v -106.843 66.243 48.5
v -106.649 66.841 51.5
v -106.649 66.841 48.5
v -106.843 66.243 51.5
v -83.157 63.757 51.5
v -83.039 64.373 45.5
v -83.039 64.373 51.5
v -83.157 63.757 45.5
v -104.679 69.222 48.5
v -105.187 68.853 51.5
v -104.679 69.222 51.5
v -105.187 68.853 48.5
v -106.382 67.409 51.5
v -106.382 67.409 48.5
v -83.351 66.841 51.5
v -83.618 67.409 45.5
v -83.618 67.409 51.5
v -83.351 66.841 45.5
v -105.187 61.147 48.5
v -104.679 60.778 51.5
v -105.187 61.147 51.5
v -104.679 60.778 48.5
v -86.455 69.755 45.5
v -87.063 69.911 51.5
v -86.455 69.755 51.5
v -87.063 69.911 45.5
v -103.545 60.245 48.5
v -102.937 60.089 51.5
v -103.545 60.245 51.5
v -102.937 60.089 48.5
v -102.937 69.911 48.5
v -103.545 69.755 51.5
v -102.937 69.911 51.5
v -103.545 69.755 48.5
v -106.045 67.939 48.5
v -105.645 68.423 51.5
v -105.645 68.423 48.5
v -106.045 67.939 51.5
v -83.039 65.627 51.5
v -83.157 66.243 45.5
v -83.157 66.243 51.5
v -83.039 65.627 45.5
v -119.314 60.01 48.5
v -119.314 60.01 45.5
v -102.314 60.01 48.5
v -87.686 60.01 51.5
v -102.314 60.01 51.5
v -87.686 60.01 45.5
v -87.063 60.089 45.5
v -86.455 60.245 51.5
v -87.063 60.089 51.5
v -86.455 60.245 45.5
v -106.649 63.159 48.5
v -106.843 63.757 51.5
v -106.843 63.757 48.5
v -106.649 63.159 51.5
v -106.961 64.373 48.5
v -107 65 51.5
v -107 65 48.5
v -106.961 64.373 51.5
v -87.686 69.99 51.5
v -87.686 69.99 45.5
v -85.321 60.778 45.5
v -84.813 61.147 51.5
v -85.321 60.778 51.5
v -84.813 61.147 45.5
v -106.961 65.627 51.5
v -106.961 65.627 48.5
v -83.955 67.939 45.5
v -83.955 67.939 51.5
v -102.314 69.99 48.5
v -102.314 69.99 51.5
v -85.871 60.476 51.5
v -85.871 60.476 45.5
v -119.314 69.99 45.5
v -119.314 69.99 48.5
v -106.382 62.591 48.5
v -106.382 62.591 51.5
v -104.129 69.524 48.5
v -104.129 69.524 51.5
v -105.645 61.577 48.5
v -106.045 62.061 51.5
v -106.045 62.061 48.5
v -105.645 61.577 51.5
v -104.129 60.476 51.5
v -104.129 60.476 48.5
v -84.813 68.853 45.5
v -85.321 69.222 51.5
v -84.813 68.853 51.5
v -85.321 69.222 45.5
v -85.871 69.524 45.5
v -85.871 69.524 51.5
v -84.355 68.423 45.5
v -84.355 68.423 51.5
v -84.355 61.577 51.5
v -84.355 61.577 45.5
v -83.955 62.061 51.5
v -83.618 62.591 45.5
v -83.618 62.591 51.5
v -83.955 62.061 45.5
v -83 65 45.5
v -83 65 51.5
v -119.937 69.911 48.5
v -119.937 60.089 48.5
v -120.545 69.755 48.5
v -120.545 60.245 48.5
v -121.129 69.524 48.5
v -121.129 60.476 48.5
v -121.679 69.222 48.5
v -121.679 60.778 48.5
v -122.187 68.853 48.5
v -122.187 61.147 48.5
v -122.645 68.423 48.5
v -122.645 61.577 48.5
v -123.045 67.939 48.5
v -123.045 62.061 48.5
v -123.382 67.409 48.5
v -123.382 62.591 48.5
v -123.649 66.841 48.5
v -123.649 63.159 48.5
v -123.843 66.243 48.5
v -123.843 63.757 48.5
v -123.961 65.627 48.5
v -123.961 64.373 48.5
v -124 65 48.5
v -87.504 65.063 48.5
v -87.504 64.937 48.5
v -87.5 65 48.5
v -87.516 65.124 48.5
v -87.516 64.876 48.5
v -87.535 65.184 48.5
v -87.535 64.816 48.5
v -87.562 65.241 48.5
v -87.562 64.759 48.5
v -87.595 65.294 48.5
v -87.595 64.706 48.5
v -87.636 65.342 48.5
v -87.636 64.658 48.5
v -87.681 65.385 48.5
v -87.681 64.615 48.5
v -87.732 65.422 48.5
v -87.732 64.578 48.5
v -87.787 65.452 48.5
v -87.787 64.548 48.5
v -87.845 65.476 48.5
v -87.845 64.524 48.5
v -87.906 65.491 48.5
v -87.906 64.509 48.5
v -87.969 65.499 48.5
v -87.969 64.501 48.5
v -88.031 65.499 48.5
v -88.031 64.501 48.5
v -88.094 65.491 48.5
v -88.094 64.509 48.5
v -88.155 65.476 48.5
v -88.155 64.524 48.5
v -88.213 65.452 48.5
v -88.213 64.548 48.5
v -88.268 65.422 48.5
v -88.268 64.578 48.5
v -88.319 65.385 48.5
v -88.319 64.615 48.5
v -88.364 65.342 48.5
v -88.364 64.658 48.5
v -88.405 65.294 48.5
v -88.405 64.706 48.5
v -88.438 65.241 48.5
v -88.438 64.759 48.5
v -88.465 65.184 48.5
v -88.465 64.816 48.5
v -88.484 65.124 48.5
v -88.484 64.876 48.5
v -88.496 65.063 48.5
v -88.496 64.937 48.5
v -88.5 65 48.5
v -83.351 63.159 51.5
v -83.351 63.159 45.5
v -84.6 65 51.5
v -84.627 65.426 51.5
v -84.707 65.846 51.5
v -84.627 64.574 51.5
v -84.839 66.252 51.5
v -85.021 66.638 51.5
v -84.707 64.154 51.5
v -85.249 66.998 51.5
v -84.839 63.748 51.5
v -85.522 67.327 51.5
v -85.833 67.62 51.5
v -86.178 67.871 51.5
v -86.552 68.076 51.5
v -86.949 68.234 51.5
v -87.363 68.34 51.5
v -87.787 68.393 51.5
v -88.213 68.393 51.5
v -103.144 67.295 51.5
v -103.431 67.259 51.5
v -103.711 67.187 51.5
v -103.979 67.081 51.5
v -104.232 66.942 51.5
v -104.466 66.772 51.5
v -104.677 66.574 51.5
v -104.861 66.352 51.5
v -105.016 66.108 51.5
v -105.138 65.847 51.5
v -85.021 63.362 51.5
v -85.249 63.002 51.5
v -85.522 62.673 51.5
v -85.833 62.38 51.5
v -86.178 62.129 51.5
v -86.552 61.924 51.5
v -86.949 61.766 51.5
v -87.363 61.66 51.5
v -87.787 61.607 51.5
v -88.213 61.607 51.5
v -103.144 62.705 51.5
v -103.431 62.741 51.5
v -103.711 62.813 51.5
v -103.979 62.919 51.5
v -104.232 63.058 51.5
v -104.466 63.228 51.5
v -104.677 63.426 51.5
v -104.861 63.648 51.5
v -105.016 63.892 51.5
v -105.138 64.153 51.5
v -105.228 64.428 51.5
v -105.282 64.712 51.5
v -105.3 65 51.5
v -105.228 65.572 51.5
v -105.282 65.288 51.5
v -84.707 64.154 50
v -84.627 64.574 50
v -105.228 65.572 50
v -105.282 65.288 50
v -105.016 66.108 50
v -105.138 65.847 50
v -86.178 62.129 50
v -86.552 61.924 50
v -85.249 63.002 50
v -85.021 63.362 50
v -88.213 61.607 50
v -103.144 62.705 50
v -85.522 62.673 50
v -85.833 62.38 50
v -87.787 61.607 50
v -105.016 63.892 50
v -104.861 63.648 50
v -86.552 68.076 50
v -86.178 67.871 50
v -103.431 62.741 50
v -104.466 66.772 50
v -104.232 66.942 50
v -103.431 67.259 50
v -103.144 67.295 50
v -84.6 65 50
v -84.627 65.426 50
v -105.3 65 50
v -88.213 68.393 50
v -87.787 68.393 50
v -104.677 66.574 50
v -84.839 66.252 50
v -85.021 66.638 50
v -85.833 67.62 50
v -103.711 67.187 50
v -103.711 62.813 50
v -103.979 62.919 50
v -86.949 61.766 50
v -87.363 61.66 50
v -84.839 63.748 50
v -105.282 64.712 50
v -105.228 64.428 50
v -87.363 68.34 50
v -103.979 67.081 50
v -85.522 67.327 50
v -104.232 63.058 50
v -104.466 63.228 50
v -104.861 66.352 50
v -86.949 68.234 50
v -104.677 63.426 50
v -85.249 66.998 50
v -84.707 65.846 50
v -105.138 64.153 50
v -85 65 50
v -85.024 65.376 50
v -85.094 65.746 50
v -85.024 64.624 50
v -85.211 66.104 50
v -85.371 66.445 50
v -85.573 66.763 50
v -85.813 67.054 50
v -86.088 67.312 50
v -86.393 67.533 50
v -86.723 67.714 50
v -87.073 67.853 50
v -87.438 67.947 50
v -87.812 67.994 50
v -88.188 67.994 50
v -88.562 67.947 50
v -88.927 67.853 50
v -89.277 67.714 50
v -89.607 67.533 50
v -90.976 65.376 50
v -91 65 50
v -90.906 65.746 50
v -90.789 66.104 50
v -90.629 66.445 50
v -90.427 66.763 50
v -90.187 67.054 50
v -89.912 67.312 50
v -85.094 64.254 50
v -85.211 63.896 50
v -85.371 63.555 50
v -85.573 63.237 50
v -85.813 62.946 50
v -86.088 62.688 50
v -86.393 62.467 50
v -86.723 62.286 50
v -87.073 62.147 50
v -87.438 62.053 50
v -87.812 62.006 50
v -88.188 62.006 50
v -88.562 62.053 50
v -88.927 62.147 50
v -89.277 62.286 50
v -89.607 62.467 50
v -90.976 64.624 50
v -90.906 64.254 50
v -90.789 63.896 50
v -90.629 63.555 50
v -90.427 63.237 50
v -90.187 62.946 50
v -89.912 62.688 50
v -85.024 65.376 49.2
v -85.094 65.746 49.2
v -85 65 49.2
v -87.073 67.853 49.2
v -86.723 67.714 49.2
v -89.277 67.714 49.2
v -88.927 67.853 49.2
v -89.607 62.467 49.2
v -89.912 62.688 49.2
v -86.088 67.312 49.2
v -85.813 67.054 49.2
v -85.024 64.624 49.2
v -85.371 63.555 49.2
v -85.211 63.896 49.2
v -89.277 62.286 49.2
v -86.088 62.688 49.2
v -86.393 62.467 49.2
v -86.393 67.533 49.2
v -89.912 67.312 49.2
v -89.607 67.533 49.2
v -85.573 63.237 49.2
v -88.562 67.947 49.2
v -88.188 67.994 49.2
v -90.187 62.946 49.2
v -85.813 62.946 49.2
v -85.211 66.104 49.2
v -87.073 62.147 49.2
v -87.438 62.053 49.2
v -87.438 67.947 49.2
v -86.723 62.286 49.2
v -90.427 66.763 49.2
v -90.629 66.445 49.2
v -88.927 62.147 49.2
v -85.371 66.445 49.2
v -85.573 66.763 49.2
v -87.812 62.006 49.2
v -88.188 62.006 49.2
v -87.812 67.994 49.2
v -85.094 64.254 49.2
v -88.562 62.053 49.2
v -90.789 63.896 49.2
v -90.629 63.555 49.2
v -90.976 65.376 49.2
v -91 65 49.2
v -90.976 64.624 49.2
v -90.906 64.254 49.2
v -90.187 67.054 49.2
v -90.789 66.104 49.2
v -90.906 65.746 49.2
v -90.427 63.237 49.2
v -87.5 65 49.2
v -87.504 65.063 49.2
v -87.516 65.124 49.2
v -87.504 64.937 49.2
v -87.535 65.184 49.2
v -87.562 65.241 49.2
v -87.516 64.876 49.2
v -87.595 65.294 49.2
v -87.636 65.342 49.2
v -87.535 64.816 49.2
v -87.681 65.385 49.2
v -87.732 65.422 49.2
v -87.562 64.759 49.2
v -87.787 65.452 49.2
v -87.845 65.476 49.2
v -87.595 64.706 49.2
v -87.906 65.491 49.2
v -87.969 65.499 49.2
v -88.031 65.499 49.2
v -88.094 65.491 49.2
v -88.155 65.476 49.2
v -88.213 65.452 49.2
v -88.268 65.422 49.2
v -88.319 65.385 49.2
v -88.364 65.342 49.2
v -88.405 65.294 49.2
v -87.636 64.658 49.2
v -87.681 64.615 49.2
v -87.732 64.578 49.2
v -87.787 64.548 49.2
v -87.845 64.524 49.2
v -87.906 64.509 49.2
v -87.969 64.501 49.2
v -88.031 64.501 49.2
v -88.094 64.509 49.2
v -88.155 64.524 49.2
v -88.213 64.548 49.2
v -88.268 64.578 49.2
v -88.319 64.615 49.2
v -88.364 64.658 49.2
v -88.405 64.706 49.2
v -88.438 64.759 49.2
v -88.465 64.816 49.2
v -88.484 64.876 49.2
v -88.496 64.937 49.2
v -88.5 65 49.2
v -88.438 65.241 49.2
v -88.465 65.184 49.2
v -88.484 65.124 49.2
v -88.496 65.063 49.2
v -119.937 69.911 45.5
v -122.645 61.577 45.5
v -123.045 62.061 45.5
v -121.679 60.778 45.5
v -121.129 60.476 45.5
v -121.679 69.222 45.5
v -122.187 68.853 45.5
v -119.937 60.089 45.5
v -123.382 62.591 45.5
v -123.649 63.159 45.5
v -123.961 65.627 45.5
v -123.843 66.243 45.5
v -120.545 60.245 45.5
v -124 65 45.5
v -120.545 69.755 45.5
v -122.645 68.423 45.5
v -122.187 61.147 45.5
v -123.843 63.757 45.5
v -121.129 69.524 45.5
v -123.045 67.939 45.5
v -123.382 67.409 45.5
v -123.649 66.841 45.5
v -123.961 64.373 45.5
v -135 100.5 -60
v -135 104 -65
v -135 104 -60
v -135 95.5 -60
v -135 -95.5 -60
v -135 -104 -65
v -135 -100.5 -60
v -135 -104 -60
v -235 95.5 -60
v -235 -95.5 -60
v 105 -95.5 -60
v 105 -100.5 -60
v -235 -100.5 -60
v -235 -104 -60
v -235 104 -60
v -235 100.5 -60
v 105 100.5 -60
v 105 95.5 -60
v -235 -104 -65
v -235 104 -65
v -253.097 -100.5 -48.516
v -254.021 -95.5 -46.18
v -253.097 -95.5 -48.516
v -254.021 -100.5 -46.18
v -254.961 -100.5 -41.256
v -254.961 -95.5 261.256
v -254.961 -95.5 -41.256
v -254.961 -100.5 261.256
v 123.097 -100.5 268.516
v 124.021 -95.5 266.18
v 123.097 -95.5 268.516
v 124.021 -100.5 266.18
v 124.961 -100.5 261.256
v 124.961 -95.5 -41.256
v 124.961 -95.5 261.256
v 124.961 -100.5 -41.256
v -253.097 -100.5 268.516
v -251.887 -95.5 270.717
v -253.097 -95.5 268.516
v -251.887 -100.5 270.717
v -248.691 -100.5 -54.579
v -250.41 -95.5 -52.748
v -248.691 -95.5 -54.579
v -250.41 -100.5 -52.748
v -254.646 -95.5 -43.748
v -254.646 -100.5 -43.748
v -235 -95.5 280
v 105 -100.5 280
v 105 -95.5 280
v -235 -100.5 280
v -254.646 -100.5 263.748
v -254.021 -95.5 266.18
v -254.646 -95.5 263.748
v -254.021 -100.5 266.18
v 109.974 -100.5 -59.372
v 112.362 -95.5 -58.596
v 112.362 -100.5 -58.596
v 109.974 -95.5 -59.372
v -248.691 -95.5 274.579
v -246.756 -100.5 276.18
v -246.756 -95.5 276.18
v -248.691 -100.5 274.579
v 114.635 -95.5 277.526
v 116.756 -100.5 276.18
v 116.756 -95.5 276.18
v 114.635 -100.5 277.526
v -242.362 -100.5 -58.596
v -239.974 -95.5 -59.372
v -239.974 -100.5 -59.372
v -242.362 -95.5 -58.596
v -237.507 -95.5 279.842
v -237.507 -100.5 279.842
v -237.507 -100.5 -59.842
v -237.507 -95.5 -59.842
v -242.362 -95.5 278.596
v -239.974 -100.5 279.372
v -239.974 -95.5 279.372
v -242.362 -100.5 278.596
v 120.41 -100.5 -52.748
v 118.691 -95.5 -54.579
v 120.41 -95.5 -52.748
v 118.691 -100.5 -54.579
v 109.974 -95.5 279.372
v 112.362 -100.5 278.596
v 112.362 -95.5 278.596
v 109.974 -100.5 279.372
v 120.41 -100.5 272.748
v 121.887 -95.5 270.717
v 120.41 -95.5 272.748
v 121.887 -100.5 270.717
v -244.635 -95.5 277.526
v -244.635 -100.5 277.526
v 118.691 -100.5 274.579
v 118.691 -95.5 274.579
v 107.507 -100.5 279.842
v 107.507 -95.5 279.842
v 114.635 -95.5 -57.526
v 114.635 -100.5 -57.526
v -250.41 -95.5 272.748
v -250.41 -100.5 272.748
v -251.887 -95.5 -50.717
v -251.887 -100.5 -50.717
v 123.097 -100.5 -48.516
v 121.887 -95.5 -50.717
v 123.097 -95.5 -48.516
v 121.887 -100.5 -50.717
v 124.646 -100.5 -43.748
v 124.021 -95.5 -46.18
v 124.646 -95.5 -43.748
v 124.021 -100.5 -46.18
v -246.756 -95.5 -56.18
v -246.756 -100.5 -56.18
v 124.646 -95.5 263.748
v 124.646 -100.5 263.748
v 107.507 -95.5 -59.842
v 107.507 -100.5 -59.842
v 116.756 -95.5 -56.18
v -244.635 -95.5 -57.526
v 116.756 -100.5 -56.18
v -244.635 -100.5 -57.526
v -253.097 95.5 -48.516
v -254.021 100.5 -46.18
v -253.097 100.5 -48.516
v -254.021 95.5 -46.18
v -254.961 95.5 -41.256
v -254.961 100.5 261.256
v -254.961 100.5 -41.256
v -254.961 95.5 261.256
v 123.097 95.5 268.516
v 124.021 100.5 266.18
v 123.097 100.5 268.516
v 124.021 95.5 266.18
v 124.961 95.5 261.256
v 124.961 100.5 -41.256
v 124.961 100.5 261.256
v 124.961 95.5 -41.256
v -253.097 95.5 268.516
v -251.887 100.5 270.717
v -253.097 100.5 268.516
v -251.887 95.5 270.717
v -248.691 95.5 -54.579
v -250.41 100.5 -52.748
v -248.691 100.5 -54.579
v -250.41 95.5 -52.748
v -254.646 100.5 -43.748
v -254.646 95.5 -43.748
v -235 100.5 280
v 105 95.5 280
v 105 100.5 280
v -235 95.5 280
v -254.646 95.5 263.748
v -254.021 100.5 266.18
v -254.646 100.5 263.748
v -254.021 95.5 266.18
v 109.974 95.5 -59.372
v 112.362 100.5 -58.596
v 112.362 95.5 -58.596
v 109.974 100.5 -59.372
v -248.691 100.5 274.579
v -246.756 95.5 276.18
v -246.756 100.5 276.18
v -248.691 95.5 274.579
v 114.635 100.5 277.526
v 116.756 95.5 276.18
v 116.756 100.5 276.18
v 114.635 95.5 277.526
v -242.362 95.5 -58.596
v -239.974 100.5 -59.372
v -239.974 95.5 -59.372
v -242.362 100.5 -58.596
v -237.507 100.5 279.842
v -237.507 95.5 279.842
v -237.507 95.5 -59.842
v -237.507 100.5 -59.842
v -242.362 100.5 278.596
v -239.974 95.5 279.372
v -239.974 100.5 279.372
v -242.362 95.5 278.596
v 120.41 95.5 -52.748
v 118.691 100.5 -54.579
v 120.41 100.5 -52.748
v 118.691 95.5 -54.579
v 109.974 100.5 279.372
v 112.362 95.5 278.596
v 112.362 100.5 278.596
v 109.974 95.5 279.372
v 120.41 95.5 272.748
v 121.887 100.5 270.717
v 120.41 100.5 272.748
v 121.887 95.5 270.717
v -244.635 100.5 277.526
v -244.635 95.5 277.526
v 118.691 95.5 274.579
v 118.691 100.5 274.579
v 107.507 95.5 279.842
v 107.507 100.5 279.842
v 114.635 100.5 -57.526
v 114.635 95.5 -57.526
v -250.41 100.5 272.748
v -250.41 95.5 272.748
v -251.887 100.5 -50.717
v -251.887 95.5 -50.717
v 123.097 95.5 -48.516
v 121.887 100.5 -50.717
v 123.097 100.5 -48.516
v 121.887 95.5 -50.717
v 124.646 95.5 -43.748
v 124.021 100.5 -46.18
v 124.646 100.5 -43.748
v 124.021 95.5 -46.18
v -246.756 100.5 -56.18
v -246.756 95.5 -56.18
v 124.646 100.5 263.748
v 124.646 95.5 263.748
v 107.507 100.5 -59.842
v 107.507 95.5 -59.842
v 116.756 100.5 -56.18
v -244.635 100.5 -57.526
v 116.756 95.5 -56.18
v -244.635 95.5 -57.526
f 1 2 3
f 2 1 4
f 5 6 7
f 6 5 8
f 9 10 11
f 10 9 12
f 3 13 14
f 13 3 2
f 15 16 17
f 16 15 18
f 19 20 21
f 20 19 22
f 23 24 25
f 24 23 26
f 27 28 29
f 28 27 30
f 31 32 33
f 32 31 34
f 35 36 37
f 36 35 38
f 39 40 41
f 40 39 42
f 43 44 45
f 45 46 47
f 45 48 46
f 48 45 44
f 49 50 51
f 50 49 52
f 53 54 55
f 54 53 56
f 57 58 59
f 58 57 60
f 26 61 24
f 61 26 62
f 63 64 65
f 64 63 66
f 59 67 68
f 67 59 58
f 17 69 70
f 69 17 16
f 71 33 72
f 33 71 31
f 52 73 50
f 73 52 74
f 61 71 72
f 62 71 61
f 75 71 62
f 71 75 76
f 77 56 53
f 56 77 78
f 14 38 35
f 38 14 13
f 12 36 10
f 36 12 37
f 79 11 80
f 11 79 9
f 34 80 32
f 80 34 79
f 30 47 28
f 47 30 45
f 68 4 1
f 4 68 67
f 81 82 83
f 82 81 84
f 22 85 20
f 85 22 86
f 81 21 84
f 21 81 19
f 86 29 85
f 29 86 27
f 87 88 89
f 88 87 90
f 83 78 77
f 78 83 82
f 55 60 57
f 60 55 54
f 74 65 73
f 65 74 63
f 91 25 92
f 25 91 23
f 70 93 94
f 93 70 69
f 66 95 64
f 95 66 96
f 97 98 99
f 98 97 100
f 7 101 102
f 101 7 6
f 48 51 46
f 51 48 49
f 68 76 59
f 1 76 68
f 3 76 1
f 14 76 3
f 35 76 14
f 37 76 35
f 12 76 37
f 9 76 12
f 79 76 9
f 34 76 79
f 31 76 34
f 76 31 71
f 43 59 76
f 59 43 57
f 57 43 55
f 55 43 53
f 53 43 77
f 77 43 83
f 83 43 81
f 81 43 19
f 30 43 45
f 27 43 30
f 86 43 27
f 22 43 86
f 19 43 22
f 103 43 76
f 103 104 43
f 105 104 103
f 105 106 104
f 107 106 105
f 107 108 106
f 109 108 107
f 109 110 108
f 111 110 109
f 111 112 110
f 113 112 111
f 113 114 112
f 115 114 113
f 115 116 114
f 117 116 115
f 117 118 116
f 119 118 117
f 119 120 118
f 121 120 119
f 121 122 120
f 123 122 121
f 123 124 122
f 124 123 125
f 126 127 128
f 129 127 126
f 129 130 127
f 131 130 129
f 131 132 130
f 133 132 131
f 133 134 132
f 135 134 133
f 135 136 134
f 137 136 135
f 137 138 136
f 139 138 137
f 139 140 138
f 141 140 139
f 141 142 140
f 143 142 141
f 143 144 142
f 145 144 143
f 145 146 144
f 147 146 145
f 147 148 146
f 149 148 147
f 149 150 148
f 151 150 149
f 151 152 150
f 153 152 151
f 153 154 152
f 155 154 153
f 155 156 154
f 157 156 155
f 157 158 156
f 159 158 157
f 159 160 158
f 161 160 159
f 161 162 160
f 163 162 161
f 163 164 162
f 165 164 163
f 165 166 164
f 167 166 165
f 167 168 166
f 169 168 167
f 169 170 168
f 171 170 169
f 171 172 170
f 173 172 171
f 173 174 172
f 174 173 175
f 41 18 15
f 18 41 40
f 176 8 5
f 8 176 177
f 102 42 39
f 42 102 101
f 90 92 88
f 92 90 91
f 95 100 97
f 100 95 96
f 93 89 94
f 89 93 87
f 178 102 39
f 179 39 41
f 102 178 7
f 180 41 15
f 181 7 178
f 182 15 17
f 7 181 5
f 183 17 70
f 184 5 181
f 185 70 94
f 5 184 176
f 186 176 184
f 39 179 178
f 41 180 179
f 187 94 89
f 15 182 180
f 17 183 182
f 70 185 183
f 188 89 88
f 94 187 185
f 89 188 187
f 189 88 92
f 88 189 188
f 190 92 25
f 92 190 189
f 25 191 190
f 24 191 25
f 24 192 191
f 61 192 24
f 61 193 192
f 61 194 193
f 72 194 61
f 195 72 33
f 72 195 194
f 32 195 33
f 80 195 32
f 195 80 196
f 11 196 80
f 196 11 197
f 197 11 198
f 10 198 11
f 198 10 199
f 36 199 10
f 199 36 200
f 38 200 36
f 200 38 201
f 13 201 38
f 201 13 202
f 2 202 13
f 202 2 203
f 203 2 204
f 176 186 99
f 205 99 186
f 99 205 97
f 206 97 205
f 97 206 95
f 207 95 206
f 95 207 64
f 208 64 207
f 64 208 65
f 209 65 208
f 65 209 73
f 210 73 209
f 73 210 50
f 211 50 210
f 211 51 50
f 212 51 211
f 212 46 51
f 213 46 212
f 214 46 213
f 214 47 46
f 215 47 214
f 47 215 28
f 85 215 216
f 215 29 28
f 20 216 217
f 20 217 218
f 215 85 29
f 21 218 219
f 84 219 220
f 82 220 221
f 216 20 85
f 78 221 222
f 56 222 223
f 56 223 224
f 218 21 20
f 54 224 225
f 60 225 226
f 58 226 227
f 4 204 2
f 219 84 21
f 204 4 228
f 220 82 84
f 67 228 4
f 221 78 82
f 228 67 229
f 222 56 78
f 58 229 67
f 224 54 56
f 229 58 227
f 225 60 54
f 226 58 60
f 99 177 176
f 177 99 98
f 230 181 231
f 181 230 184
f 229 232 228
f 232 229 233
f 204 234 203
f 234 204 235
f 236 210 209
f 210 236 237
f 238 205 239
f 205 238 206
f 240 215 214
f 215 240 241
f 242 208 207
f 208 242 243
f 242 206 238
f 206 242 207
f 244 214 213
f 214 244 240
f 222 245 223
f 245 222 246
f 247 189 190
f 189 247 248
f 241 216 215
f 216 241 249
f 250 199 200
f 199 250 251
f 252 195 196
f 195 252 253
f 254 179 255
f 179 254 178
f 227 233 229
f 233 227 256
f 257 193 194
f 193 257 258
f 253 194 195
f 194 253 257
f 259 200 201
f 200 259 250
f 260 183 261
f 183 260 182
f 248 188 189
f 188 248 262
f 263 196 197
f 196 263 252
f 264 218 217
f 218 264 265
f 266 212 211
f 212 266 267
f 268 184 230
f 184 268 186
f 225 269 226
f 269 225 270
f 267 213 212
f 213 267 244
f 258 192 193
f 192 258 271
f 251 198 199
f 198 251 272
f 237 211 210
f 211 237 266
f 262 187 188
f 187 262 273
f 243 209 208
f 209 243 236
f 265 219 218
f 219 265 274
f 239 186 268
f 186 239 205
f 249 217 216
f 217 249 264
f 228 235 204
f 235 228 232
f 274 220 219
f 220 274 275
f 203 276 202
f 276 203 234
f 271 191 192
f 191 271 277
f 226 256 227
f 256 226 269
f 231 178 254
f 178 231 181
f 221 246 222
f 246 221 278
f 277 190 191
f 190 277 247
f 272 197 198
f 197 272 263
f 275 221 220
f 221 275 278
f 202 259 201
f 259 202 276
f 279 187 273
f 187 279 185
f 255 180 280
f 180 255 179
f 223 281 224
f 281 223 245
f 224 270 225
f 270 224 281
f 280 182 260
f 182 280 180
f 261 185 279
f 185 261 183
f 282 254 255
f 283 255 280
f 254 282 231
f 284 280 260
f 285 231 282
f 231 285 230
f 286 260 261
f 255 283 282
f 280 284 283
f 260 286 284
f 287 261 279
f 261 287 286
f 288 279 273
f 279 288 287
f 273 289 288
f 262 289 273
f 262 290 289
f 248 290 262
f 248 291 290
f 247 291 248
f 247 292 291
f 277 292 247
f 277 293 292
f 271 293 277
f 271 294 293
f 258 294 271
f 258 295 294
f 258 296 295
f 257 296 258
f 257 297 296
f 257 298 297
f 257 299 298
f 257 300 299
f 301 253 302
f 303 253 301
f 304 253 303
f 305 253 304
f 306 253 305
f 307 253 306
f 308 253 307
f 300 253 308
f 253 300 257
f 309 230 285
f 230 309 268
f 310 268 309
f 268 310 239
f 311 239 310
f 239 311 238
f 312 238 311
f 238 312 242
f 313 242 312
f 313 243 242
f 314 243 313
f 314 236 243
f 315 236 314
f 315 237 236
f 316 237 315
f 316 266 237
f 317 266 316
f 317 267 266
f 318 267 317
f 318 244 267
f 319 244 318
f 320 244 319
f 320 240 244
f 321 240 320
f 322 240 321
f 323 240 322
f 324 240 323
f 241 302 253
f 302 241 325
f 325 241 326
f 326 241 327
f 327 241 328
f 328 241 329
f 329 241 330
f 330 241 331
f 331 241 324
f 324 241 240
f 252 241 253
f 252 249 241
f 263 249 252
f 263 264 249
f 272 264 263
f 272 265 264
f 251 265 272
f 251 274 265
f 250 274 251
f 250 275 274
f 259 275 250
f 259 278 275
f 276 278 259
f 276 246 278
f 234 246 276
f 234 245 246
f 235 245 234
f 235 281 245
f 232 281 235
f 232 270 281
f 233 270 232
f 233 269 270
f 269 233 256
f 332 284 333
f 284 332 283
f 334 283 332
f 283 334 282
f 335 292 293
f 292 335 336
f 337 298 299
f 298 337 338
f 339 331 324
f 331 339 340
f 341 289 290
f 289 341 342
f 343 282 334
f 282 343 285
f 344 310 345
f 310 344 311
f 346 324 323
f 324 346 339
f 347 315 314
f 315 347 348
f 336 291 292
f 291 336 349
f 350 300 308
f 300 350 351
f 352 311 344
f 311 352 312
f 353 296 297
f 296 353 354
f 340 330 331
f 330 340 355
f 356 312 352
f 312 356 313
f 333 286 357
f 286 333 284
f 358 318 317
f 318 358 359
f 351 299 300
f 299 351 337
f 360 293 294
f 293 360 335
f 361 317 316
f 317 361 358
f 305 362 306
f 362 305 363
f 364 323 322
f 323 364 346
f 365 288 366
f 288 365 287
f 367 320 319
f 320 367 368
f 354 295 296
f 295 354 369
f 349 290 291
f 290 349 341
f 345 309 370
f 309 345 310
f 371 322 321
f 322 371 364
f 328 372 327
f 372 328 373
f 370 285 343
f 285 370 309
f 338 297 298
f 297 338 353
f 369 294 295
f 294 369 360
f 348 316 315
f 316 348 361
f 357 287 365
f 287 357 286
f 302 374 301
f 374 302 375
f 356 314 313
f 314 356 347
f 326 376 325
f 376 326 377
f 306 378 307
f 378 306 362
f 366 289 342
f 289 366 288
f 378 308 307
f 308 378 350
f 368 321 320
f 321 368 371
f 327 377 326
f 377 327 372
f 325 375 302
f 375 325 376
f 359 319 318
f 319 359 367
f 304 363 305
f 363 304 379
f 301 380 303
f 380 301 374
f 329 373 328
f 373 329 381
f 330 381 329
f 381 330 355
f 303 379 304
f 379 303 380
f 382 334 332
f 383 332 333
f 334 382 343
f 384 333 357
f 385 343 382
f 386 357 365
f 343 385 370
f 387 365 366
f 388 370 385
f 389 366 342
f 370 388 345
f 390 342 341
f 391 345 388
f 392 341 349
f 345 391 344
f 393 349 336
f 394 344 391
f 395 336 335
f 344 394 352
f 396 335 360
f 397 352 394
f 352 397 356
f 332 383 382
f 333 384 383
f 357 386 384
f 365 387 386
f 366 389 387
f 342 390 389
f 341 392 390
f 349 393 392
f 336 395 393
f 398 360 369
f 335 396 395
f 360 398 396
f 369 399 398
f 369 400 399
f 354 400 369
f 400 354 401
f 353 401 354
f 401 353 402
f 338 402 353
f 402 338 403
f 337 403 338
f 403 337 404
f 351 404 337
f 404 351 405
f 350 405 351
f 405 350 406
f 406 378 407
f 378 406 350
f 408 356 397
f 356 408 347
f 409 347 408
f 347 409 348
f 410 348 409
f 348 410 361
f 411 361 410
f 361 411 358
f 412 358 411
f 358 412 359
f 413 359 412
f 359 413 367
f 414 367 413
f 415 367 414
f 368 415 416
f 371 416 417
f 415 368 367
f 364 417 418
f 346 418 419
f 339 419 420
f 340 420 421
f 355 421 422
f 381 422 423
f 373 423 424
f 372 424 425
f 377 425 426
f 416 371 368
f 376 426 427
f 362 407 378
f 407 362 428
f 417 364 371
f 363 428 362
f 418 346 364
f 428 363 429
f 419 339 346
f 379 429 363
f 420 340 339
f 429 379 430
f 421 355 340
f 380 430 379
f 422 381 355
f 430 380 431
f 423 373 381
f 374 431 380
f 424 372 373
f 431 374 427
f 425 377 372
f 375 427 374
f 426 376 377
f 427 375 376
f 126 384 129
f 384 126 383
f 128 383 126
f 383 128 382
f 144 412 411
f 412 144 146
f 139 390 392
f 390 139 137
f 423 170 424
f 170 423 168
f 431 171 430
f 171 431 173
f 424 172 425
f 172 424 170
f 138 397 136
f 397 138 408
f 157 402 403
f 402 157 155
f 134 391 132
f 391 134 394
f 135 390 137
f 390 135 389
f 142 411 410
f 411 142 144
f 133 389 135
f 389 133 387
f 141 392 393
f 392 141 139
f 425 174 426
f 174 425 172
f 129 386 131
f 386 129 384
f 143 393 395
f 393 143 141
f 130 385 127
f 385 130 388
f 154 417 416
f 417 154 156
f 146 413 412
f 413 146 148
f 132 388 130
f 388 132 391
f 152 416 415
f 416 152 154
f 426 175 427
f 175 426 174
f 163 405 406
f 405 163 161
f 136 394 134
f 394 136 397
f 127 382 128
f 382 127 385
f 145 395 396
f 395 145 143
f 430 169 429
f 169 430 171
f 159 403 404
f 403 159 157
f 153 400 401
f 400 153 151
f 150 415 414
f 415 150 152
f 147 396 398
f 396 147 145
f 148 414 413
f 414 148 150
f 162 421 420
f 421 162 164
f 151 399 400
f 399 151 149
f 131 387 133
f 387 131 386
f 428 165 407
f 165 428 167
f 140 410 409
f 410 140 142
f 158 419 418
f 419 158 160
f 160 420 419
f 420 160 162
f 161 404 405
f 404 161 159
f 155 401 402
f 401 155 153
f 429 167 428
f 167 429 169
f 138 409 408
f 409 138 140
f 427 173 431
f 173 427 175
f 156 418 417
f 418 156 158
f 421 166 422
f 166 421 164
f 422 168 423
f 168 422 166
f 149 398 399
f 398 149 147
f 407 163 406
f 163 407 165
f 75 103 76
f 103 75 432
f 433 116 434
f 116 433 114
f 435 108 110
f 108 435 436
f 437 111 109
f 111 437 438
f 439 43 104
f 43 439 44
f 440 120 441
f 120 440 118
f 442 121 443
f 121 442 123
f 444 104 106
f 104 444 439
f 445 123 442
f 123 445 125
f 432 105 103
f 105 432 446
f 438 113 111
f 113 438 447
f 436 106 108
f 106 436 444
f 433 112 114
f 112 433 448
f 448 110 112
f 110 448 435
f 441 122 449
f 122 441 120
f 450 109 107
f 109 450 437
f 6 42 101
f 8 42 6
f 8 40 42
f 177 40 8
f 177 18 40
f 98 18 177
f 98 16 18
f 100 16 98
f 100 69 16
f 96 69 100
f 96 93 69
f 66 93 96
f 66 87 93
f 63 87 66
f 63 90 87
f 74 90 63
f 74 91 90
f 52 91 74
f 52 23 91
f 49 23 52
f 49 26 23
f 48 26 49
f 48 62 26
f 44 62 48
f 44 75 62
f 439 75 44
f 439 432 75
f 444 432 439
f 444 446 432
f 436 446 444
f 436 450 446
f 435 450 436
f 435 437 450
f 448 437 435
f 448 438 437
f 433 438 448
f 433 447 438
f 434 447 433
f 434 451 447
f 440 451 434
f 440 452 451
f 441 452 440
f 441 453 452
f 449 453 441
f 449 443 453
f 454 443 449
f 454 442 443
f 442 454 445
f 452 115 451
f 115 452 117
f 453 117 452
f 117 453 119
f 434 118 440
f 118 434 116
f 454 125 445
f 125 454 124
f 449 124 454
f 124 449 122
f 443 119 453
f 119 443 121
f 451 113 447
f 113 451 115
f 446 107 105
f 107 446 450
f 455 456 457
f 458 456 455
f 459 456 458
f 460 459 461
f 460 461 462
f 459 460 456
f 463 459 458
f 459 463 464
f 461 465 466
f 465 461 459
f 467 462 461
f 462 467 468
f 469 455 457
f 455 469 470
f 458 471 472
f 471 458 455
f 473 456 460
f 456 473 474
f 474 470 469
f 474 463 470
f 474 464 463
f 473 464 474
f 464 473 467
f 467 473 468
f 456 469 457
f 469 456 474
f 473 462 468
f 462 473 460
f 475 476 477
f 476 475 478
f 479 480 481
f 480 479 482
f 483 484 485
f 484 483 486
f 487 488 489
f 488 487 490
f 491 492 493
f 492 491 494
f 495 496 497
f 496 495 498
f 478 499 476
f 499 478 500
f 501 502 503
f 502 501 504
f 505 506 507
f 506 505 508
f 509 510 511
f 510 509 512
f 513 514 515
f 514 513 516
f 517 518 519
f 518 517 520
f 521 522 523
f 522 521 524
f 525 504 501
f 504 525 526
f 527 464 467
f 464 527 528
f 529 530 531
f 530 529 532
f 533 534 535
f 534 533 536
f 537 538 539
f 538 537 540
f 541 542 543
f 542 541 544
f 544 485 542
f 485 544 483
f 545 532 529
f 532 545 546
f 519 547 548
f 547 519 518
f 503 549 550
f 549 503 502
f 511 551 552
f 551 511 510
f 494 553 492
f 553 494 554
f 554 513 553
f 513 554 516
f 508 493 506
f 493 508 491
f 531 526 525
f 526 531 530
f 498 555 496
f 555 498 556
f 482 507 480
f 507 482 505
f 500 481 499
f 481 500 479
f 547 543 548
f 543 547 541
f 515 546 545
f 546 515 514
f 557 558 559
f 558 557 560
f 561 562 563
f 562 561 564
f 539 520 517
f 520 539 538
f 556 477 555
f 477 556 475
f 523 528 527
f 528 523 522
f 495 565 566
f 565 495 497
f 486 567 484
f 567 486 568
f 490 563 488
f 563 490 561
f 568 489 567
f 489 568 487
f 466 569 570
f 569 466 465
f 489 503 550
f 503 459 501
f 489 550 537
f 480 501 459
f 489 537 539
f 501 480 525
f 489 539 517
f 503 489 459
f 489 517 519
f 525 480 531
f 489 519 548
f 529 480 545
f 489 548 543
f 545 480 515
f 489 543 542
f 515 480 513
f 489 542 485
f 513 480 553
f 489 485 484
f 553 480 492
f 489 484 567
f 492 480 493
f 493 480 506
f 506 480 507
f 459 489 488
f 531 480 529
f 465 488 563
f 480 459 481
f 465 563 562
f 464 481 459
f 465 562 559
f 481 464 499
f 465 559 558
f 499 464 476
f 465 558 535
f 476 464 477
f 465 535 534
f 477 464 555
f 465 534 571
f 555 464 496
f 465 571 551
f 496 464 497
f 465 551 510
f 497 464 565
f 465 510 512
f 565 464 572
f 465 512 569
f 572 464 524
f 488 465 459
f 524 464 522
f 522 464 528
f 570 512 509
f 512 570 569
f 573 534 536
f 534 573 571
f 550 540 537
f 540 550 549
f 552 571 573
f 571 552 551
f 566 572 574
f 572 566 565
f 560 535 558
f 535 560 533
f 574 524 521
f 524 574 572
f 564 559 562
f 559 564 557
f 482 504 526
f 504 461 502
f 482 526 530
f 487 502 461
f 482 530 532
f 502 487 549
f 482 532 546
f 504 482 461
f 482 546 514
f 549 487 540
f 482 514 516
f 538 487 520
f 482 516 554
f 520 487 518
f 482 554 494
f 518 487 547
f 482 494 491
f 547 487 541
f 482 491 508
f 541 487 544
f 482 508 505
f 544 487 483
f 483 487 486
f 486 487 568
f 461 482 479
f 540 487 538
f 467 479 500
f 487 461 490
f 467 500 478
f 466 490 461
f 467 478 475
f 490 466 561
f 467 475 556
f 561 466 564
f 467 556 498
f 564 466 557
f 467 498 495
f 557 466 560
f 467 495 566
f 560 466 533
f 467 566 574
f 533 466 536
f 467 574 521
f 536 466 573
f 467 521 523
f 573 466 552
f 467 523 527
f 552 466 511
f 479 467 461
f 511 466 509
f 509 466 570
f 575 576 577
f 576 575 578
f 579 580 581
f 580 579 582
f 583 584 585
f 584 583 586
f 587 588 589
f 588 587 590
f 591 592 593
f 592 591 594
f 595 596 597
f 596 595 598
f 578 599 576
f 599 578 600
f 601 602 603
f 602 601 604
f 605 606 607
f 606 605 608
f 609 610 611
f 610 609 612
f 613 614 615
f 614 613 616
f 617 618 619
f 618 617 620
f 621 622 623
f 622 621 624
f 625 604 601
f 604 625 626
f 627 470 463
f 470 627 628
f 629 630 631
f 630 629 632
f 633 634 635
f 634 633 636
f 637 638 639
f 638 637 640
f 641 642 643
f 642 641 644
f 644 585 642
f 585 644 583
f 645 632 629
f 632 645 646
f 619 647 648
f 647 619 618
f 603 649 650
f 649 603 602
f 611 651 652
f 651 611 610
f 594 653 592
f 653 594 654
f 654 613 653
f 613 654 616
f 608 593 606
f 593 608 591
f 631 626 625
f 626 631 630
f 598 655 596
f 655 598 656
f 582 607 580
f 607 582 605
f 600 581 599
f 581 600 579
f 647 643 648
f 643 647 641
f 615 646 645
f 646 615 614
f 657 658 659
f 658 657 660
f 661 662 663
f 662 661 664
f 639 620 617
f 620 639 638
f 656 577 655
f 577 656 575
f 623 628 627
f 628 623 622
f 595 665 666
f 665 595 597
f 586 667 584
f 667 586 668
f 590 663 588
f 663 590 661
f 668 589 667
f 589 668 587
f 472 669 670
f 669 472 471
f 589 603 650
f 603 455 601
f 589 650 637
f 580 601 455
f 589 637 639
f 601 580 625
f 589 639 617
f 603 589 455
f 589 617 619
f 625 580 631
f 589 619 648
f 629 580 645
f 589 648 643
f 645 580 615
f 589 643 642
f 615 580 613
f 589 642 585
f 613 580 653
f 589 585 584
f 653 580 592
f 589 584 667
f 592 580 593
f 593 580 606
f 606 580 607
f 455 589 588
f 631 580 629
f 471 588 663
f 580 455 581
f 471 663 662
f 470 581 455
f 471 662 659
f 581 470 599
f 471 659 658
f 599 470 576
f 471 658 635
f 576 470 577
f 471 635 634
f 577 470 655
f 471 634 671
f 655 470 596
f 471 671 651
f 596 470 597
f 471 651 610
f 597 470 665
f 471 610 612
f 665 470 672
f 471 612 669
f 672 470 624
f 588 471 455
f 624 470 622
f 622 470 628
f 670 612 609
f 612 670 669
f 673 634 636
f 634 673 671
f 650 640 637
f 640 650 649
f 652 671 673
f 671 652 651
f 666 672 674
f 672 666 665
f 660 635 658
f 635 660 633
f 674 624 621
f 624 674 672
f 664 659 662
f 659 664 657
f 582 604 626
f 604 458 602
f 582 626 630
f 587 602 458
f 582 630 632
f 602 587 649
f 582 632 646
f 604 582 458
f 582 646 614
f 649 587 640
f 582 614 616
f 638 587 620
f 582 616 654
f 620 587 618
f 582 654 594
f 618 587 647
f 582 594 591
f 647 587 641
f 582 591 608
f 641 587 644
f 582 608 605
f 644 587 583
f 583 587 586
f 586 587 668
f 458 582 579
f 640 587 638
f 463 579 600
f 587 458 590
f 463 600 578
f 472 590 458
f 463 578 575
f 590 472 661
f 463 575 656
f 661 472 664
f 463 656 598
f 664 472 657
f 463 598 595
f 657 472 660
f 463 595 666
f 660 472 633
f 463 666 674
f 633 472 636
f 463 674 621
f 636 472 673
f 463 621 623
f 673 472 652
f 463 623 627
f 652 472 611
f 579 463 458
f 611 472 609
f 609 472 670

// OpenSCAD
// file: hardware.scad
//Hardware objects such as bearings and motors
//defined here for convenience

//Mark Benson - April 2013
//
// CC - GNU


//Define generic, configurable module to generate a 'bearing'
module bearing(outerRaceSize, innerRaceSize, thickness)
{
	difference()
	{	
		cylinder(r=outerRaceSize/2, h=thickness);
		cylinder(r=innerRaceSize/2, h=thickness);
	}
}

//Now define bearing module with real world parameters

//Predefined 608 Bearing
module bearing608()
{
	bearing(22, 8, 7);
}

//Predefined 624 Bearing
module bearing624()
{
	bearing(13, 4, 5);
}

//Predefined 626 Bearing
module bearing626()
{
	bearing(19, 6, 6);
}

//Predefined LM8UU Bearing
module bearingLM8UU()
{
	bearing(15, 8, 24);
}

//Test bearing modules
//Uncomment line(s) below to test
//
//Note: Translations allow all bearings to shown at the same time
//rather than being on top of each other

//translate([0,0,0]) bearing624();
//translate([0,20,0]) bearingLM8UU();
//translate([0,43,0]) bearing626();
//translate([0,70,0]) bearing608();




// ** STEPPER MOTORS **
//
//
//Define a generic stepper motor module

module stepperMotor(caseSize, caseHeight, holeSpacing, holeDiameter, shaftDiameter, shaftHeight, shaftCollarDiameter, shaftCollarThickness)
{
	
	//Mounting Hole Depth is predefined @ >= 4.5mm
	mountingHoleDepth = 4.5;

	union()
	{

		//Shaft
		//Note: We add 1mm and translate to -1 in Z to show shaft 
		//on bottom of motor
		translate([caseSize/2,caseSize/2,-1]) 
		cylinder(r=shaftDiameter/2, h=caseHeight+shaftHeight+1);	

		//Shaft collar
		translate([caseSize/2,caseSize/2,caseHeight]) 
		cylinder(r=shaftCollarDiameter/2, h=shaftCollarThickness);

		difference()
		{
			cube([caseSize, caseSize, caseHeight]);
		
			translate([(caseSize-holeSpacing)/2,(caseSize-holeSpacing)/2,caseHeight-mountingHoleDepth]) 
			cylinder(r=holeDiameter/2, h=mountingHoleDepth);

			translate([caseSize-((caseSize-holeSpacing)/2),(caseSize-holeSpacing)/2,caseHeight-mountingHoleDepth]) 
			cylinder(r=holeDiameter/2, h=mountingHoleDepth);

			translate([(caseSize-holeSpacing)/2,caseSize-((caseSize-holeSpacing)/2),caseHeight-mountingHoleDepth]) 
			cylinder(r=holeDiameter/2, h=mountingHoleDepth);

			translate([caseSize-((caseSize-holeSpacing)/2),caseSize-((caseSize-holeSpacing)/2),caseHeight-mountingHoleDepth]) 
			cylinder(r=holeDiameter/2, h=mountingHoleDepth);
		}
	}
	
}


//Define stepper motor with real world parameters

//Predefined NEMA14 stepper motor
module nema14()
{
	stepperMotor(35.2, 36, 26.0, 3, 5, 24, 22, 2);
}


//Predefined NEMA17 stepper motor
module nema17()
{
	stepperMotor(42, 48, 31, 3, 5, 24, 22, 2);
}


//Test stepper motors
//Note: Translations allow all objects to appear on screen together
//rather than being shown one on top of the other
//translate([20,0,0]) nema14();
//translate([20,50,0]) nema17();
// file: servo.scad
module servoSG90() {
    L = 22.8;
    l = 12.6;
    h = 22.8;
    plateL = 32.5;
    plateH = 2.7;
    plateHPos = 16;
    topCylinderH = 3.4;
    smallTopCylinderD = 4.5;
    
    axisH = 2;
    axisD = 4;
    
    screwHoleCenter=2;
    screwHoleD=2;
    holeSize=1;
    
    difference() {
        union() {
            color("LightBlue", 0.5) {
                // main part
                cube([L, l, h]);
                // support
                translate([-(plateL - L) / 2, 0, plateHPos]) {
                    cube([plateL, l, plateH]);
                }
                // top big cylinder
                translate([l/2,l/2,h]) {
                    cylinder(d=l, h=topCylinderH, $fn=180);
                }
                // top small cylinder
                translate([l, l/2, h]) { 
                    cylinder(d=smallTopCylinderD, h=topCylinderH, $fn=180);
                }
            }
            translate([l/2,l/2, h + topCylinderH]) {
                color("white") {
                    cylinder(d=axisD,h=axisH, $fn=180);
                }
            }
        }
        translate([-(plateL - L) / 2 + screwHoleCenter, l/2, plateHPos]) {
            cylinder(d=screwHoleD, h=10, $fn=180, center=true);
        }
        translate([-(plateL - L) / 2 - 1, l / 2 - holeSize / 2, plateHPos - 1]) {
            cube([3,holeSize,4]);
        }
        translate([plateL - (plateL - L) / 2 - screwHoleCenter, l / 2, plateHPos - 1]) {
            cylinder(d=screwHoleD, h=10, $fn=180, center=true);
        }
        translate([plateL- (plateL - L) / 2 - screwHoleCenter, l / 2 - holeSize / 2, plateHPos -1]) {
            cube([3,holeSize,4]);
        }
    }
}

//servoSG90();
// file: NEMAMount.scad
/**
 * NEMAMount.scad
 *
 * Produces the shape to be subtracted from a base to make a NEMA motor mount.
 *
 * @copyright  James Newton, 2013
 * @license    http://creativecommons.org/licenses/LGPL/2.1/
 * @license    http://creativecommons.org/licenses/by-sa/3.0/
 *
 * @see        http://www.thingiverse.com/thing:137829
 *
 *
**/


/* ******************************************************************************
 * Customizer parameters and rendering
 * ****************************************************************************** */

/* [Global] */


//The NEMA size. See: massmind.org/techref/io/stepper/nemasizes.htm
NEMA_Size = 17; // [8,11,14,17,23,34,42]

//Drive Shaft clearance hole: 0=no shaft, positive # = that size, negative number = standard NEMA shaft + abs(shaft) e.g. NEMA_Mount(17,shaft=-1) gives a 5+1=6mm shaft hole.
shaft = -1; // [-50:50]

//Pilot mounting indentation diameter: 0=no indentation, positive # = that diameter, negative # = standard NEMA pilot + abs(pilot)
pilot = -1; // [-20:90]

//height of the mounting and shaft holes. e.g. the thickness of your mounting plate
height = 10; // [1:100]

//Size of nut head. 0 for no nuts or an M size.
nut_size = 4; // [0:20]

//height of the nut head. 0 for no nuts or an M height.
nut_height =3; // [0:20]

//Distance the motor can slide in the mount.
adjust = 5; // [0:10]

//Show sample base with NEMA mount subtracted.
Show_Base =  0; // [0,1]

/* [Hidden] */


/*
difference() {
	if (Show_Base==1)
		translate([-NEMA_Size*2,-NEMA_Size*2,0]) cube([NEMA_Size*4,NEMA_Size*4,height-.01]);
	NEMA_Mount (NEMA_Size, shaft, pilot, height, nut_size, nut_height, adjust);
	}

*/

module NEMA_Mount (NEMA_Size, shaft=-1, pilot=-1, height, nut_size, nut_height, adjust=0) {
	for (r = [-adjust: 2: adjust]) 
		translate([r,0,0])
		Simple_NEMA_Mount (NEMA_Size, shaft, pilot, height, nut_size, nut_height, $fs=adjust/2+0.01);
	//drop the resolution to keep from swamping the system with CSG Products.
	}

module Simple_NEMA_Mount (NEMA_Size, shaft=-1, pilot=-1, height, nut_size, nut_height) {

	NEMA_Mount = lookup(NEMA_Size,[
		[ 8,15.4/2],
		[11,23.0/2],
		[14,26.0/2],
		[17,31.04/2],
		[23,47.14/2],
		[34,69.58/2],
		[42,88.90/2]
		]);

	NEMA_Bolt = lookup(NEMA_Size,[
		[ 8,2.0/2],
		[11,2.5/2],
		[14,3.0/2],
		[17,4.0/2],
		[23,4.75/2],
		[34,6.5/2],
		[42,7.15/2]
		]);

//the -.1's here are to ensure the hole breaks through the mounting plate
	translate([-NEMA_Mount,-NEMA_Mount,-.1]) cylinder(h=height-nut_height+.2, r=NEMA_Bolt);
	if (nut_height > 0) translate([-NEMA_Mount,-NEMA_Mount,height-nut_height]) nut(nut_size, nut_height);
	translate([-NEMA_Mount,+NEMA_Mount,-.1]) cylinder(h=height-nut_height+.2, r=NEMA_Bolt);
	if (nut_height > 0) translate([-NEMA_Mount,+NEMA_Mount,height-nut_height]) nut(nut_size, nut_height);
	translate([+NEMA_Mount,-NEMA_Mount,-.1]) cylinder(h=height-nut_height+.2, r=NEMA_Bolt);
	if (nut_height > 0) translate([+NEMA_Mount,-NEMA_Mount,height-nut_height]) nut(nut_size, nut_height);
	translate([+NEMA_Mount,+NEMA_Mount,-.1]) cylinder(h=height-nut_height+.2, r=NEMA_Bolt);
	if (nut_height > 0) translate([+NEMA_Mount,+NEMA_Mount,height-nut_height]) nut(nut_size, nut_height);
	if (shaft > 0) translate([0,0,-.1]) cylinder(h=height+.1, r=shaft);
	if (shaft < 0) translate([0,0,-.1]) cylinder(h=height+.1, r=-shaft + lookup(NEMA_Size,[
		[ 8,4.00/2],
		[11,5.00/2],
		[14,5.00/2],
		[17,5.00/2],
		[23,6.35/2],
		[34,9.50/2],
		[42,16.0/2]
		])
		);
	if (pilot > 0) cylinder(h=2, r=pilot);
	if (pilot < 0) translate([0,0,-.1]) cylinder(h=2, r=-pilot + lookup(NEMA_Size,[
		[ 8,15.00/2],
		[11,22.00/2],
		[14,22.00/2],
		[17,22.00/2],
		[23,38.10/2],
		[34,73.00/2],
		[42,73.0/2]
		])
		);
	};

module nut(nutSize,nutHeight) {
	//I have no idea if this actually produces the correct size.
	// need to check against:
	//http://www.boltdepot.com/fastener-information/Nuts-Washers/Metric-Nut-Dimensions.aspx
	for (r = [-60, 0, 60]) 
		translate([0,0,nutHeight/2]) rotate([0,0,r]) cube([nutSize*1.75, nutSize, nutHeight], true);
	}
// file: exposer_box.scad
$fn = 50;
screw_distance_x = 60;
screw_distance_y = 40;
wall_thickness = 2.5;

case_width = 120;
case_length = 115;
case_height = 32;

bearing_diameter = 16;
bearing_length = 28;

fan_diameter = 28;

//rotate([0,180,0]) bottom_case();

//translate([-10,-45,-5]) rotate([0,90,-135])  laser();

//rotate([0,180,0]) top_case();

module base_form(width,length,height){
    
   translate([-length/2,-width/2,0]) minkowski(){
	cube([length,width,height],true);
    translate([length/2,width/2,0]) cylinder(1,5,5,true);
   }
   
}


module top_case(){
difference(){
 union(){
    // Base Form of Bottom Case
   	base_form(case_width,case_length,wall_thickness-1.5);

	translate([0,0,-wall_thickness-1]) 
       base_form(case_width-wall_thickness*2-1.5,case_length-wall_thickness*2-1.5,wall_thickness+4);


  } 
 	// Mirror mount slor
	translate([(case_length/2)-8,0,-wall_thickness]) cube([4,case_width,case_height],true);
	translate([0,0,-wall_thickness-2]) 
       base_form(case_width-wall_thickness*2-5,case_length-wall_thickness*2-5,wall_thickness+4);
}

}


module mirror_mount(){
   difference(){
	cube([10,5,10]);
	translate([0,-0.2,0]) rotate([0,45,0]) cube([12,5.5,10]);
   }
}

module bottom_case(){
  
  translate([case_length/2,case_width/2+3,4]) rotate([0,0,180]) mirror_mount();
  translate([case_length/2,-case_width/2+2,4]) rotate([0,0,180]) mirror_mount();		
	//# translate([case_length/2-10.5,-case_width/2,8])  
	//	translate([0,-0.2,0]) rotate([0,45,0]) cube([10,122,5]);
		
  difference(){
    
    // Base Form of Bottom Case
   	base_form(case_width,case_length,case_height);
   	translate([0,0,-wall_thickness]) 
	  base_form(case_width-wall_thickness*2,case_length-wall_thickness*2,case_height);
	

	translate([10,-case_width/2-wall_thickness-1,0]) rotate([0,90,90]) fan_cutout();

    // Polygon Mirror Holes
	translate([-20,0,case_height/2-wall_thickness/2])
      rotate([0,0,90])  polygon_mirror_screw_holes();
	
	// Polygon Mirror Bottom Hole
	translate([-25,0,case_height/2]) 
      rotate([0,0,90]) cube([screw_distance_y/1.2,screw_distance_x/1,wall_thickness+2],true);

     // Front Bearing mount
     translate([case_length/2-bearing_length/2,screw_distance_x/2+16,case_height/2-wall_thickness/2]) 
       rotate([0,0,90]) bearing_hole();
     translate([case_length/2-bearing_length/2,-screw_distance_x+14,case_height/2-wall_thickness/2]) 
    	   rotate([0,0,90]) bearing_hole();

     // Back Bearing mount
     translate([-case_length/2+bearing_length/2,-screw_distance_x+14,case_height/2-wall_thickness/2]) 
		rotate([0,0,90]) bearing_hole();
     translate([-case_length/2+bearing_length/2,screw_distance_x/2+16,case_height/2-wall_thickness/2]) 
       rotate([0,0,90]) bearing_hole();

	
	// laser mount hole
    translate([screw_distance_y/4+2,-screw_distance_x/2-16,case_height/2-wall_thickness/2]) 
      cylinder(wall_thickness+2,1.6,1.6,true);
	
     translate([20,12,15]) cylinder(20,1.6,1.6,true);
	translate([20,30,15]) cylinder(20,1.6,1.6,true);	

  }


	
}

module polygon_mirror_screw_holes(){
  translate([-screw_distance_y/2,screw_distance_x/2,0]) cylinder(wall_thickness+4,1.6,1.6,true);  
  translate([-screw_distance_y/2,-screw_distance_x/2,0]) cylinder(wall_thickness+4,1.6,1.6,true);
  translate([screw_distance_y/2,screw_distance_x/2,0]) cylinder(wall_thickness+4,1.6,1.6,true);
  translate([screw_distance_y/2,-screw_distance_x/2,0]) cylinder(wall_thickness+4,1.6,1.6,true);
}

module bearing_hole(){

    hull(){
   	   translate([0,-bearing_length/2+bearing_diameter/4,0]) 
        cylinder(wall_thickness+2,bearing_diameter/4,bearing_diameter/4,true);
    	 translate([0,bearing_length/2-bearing_diameter/4,0]) 
        cylinder(wall_thickness+2,bearing_diameter/4,bearing_diameter/4,true);
    }
    translate([8,bearing_length/3,0]) cylinder(wall_thickness+3,1.6,1.6,true);
    translate([-8,-bearing_length/3,0]) cylinder(wall_thickness+3,1.6,1.6,true);
    translate([8,-bearing_length/3,0]) cylinder(wall_thickness+3,1.6,1.6,true);
    translate([-8,bearing_length/3,0]) cylinder(wall_thickness+3,1.6,1.6,true);
 
}


module laser(){
  translate([0,0,-30]) cylinder(40,1,1,true);
   #translate([0,-40,-30]) rotate([0,-60,90]) cylinder(80,1,1,true);
   #translate([0,-70,-15]) rotate([90,90,90]) cylinder(80,1,1,true);
   cylinder(30,6,6,true);
}

module polygon_mirror(){
	 cube([67.8,47.8,1],true);
    translate([-8,0,0]){
	 translate([0,0,8.5]) cylinder(2,20,20,true,$fn=6);
     translate([0,0,4.5]) cylinder(9,16,16,true);
	 translate([0,0,-4.5]) cylinder(9,4.5,4.5,true);
   }
}

module fan_cutout(){
	cylinder(wall_thickness+2,fan_diameter/2,fan_diameter/2,true);
    rotate([0,0,45]) translate([0,fan_diameter/2+3,0]) cylinder(wall_thickness+2,1.55,1.55,true);
	rotate([0,0,-45]) translate([0,-fan_diameter/2-3,0]) cylinder(wall_thickness+2,1.55,1.55,true);
	rotate([0,0,-45]) translate([0,fan_diameter/2+3,0]) cylinder(wall_thickness+2,1.55,1.55,true);
	rotate([0,0,45]) translate([0,-fan_diameter/2-3,0]) cylinder(wall_thickness+2,1.55,1.55,true);
}
// main file
include <complete_view.scad>;

material_thickness = 5;

translate([-55,-98,120]) rotate([0,90,90]) side_wall();
translate([-55,98,120]) rotate([0,90,90]) side_wall();

translate([-185,0,-62.5])  bottom_plate();

module side_wall(){
   hull(){	
	translate([-140,180,0]) cylinder(material_thickness, 20,20,true );
	translate([160,-160,0]) cylinder(material_thickness, 20,20,true );

	translate([-140,-160,0]) cylinder(material_thickness, 20,20,true );
	translate([160,180,0]) cylinder(material_thickness, 20,20,true );
  }
}

module bottom_plate(){
	cube([100,208,5],true);
	cube([100,208,5],true);
}
